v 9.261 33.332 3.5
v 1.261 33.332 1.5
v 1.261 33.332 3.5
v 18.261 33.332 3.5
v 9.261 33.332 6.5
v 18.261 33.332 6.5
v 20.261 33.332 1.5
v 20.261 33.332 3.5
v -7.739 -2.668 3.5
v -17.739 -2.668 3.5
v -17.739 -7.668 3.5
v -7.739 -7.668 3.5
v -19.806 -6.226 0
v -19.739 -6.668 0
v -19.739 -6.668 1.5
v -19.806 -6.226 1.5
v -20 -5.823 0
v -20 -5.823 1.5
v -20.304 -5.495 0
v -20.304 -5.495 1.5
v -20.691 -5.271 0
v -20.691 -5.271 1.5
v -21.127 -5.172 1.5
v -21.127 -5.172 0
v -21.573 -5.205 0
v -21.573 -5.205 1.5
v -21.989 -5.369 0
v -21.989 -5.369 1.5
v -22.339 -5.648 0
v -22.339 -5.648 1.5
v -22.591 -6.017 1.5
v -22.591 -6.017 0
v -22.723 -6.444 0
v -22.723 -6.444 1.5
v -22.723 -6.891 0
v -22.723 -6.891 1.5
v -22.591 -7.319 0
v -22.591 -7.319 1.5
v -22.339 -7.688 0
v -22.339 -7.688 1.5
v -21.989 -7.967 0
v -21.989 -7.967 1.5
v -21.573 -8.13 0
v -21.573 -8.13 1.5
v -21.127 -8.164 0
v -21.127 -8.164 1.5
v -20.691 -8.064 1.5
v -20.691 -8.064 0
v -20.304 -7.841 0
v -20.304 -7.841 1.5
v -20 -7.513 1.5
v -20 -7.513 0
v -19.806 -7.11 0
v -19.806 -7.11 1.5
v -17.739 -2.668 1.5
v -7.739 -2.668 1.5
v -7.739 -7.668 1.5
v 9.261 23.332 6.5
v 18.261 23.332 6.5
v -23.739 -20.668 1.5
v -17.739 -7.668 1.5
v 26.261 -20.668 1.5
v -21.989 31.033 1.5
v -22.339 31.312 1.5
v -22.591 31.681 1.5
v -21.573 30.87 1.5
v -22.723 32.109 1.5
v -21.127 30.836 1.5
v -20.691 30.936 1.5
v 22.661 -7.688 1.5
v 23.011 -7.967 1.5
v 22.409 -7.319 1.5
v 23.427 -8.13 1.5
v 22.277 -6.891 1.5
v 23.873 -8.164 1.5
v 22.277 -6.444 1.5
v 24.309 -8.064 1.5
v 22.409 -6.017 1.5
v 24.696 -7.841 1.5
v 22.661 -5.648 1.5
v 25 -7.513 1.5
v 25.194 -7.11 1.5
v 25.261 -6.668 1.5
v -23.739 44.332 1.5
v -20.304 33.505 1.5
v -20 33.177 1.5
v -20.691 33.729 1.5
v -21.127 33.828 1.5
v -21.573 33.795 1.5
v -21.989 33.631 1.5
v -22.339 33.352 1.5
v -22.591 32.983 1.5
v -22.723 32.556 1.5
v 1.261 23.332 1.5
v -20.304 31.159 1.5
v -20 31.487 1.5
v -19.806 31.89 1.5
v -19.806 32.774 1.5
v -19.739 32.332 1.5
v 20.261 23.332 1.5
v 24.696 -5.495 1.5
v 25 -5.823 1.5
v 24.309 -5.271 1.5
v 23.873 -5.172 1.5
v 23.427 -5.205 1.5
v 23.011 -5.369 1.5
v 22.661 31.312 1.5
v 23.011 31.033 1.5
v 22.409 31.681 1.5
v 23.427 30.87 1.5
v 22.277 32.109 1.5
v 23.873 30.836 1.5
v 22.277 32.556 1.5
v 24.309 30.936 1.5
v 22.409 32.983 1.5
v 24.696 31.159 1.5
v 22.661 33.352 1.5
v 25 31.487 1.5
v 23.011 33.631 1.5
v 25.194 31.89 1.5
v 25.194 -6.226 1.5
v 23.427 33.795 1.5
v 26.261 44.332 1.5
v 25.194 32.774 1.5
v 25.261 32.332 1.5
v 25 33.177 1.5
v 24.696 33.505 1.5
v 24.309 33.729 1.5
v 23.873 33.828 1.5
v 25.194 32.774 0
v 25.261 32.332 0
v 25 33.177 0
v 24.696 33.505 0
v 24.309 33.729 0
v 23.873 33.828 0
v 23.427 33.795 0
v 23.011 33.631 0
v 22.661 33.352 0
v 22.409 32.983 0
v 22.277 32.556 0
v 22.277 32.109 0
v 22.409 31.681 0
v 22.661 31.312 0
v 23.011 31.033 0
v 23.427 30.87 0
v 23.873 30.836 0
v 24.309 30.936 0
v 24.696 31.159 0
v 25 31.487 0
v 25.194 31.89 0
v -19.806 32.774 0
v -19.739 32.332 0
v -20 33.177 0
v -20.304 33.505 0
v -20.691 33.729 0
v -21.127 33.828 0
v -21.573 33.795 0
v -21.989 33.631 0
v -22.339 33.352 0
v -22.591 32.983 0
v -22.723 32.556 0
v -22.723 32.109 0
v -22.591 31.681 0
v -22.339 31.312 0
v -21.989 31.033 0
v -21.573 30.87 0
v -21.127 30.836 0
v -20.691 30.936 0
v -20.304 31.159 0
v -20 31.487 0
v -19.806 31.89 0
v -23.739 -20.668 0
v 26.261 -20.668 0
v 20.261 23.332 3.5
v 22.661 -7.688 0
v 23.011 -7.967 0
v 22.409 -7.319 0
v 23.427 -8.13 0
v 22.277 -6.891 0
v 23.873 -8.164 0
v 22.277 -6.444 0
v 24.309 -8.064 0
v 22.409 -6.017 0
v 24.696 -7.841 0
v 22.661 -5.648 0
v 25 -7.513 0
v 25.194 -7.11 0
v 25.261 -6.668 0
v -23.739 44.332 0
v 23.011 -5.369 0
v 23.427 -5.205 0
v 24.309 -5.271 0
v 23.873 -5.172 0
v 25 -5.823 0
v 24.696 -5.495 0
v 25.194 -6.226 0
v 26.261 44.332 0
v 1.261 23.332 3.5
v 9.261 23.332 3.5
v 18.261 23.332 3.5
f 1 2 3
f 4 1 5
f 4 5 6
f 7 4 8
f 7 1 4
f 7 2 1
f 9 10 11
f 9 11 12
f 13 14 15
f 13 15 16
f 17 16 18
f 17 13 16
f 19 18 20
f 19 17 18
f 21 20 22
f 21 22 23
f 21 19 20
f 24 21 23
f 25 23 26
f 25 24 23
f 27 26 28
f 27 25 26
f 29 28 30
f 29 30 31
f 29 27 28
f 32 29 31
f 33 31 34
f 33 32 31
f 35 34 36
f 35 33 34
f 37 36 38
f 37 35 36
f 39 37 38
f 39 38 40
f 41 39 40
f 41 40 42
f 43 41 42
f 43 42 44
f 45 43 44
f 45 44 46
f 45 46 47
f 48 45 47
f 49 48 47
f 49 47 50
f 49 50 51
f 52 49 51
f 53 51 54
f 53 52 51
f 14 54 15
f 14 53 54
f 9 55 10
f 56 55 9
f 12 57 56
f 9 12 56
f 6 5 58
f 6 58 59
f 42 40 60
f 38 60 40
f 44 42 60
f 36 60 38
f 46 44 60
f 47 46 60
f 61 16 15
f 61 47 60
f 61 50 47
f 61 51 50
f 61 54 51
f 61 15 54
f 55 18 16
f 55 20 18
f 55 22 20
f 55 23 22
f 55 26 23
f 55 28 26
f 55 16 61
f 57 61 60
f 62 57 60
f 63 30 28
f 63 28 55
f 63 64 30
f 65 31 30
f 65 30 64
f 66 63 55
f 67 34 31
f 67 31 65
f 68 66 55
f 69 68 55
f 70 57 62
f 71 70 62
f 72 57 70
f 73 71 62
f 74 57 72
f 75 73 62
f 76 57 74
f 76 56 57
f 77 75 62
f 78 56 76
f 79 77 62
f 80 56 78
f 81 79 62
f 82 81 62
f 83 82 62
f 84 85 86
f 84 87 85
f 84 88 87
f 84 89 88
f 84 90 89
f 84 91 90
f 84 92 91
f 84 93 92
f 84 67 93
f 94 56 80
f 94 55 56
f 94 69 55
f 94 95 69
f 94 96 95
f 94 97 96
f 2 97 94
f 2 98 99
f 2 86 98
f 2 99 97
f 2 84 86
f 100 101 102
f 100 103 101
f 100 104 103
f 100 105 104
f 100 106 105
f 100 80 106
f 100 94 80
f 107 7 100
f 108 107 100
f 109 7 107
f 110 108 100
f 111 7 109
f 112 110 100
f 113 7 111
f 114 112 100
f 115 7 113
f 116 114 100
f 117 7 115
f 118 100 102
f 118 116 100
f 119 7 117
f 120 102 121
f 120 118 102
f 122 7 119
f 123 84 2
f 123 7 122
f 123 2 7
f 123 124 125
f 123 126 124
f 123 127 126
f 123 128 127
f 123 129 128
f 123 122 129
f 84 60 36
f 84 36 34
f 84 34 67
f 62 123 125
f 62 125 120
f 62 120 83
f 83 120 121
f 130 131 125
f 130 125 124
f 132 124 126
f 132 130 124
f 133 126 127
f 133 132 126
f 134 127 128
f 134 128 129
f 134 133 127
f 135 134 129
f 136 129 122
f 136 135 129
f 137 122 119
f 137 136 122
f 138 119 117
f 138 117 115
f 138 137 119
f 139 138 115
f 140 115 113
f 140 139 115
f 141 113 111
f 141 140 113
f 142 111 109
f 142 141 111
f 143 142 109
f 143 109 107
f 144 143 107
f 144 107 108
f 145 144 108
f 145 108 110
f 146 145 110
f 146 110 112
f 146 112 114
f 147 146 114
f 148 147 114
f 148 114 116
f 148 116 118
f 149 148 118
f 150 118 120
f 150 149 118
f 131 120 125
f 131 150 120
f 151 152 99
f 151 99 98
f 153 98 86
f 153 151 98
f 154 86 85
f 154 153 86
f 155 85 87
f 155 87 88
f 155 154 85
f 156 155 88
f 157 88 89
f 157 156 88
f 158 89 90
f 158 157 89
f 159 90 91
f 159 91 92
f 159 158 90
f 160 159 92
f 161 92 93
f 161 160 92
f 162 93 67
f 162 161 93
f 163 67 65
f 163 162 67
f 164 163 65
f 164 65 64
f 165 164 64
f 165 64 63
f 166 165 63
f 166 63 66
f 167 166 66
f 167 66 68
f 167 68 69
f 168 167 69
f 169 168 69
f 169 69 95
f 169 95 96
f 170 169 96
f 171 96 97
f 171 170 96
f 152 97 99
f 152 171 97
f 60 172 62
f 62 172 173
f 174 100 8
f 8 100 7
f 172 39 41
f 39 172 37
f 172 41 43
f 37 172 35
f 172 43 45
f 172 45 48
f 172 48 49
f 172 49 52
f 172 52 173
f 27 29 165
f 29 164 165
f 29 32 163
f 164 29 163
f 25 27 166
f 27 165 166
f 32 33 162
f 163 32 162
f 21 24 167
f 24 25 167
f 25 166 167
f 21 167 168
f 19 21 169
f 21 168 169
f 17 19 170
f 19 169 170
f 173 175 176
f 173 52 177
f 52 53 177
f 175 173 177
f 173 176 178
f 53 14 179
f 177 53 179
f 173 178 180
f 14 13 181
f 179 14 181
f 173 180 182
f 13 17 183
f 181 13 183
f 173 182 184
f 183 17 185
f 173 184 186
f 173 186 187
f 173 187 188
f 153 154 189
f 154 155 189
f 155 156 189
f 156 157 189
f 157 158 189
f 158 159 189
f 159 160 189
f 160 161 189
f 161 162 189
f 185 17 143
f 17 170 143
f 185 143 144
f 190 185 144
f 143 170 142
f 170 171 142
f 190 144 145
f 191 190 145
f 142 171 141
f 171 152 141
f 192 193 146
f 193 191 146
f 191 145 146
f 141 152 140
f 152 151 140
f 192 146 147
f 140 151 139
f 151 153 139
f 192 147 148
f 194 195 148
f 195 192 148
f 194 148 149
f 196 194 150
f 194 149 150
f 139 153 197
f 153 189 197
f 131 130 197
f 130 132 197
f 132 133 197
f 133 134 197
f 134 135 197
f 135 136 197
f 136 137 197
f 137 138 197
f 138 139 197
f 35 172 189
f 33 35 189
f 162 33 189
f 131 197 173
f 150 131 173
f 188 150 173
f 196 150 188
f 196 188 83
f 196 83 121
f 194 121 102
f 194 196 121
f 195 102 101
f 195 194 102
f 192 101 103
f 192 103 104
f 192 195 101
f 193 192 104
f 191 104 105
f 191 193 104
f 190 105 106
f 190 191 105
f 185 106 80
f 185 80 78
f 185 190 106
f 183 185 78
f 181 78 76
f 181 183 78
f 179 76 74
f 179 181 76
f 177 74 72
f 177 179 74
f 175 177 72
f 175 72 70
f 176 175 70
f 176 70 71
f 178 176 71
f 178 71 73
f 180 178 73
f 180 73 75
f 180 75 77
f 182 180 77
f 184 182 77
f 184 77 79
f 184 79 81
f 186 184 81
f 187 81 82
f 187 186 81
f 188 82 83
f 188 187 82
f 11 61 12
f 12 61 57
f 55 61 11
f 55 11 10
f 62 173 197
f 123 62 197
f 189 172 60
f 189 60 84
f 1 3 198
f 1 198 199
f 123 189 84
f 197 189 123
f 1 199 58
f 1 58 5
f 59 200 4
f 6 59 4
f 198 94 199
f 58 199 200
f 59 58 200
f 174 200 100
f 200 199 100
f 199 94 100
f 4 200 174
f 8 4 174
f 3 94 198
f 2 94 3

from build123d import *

# Parameters (mm, degrees)
F0_W     = 50
F0_H     = 65
F0_R     = 1.5
F1_DEPTH = 1.5
F2_W     = 10
F2_H     = 5
F3_DEPTH = 2
F2_W_2   = 9
F2_H_2   = 10
F4_DEPTH = 5
F2_W_3   = 2
F2_W_4   = 8
F5_DEPTH = 2


with BuildPart() as f1:
    # F0 (on Top) → F1 (new body)
    with BuildSketch(Plane.XY):
        with Locations((1.260573, 11.832207)):
            Rectangle(F0_W, F0_H)
        with Locations((-21.239427, -6.667793)):
            Circle(F0_R, mode=Mode.SUBTRACT)
        with Locations((23.760573, -6.667793)):
            Circle(F0_R, mode=Mode.SUBTRACT)
        with Locations((-21.239427, 32.332207)):
            Circle(F0_R, mode=Mode.SUBTRACT)
        with Locations((23.760573, 32.332207)):
            Circle(F0_R, mode=Mode.SUBTRACT)
    extrude(amount=F1_DEPTH)

    # F2 (on face) → F3 (join)
    with BuildSketch(Plane.XY.offset(1.5)):
        with Locations((-12.739427, -5.167793)):
            Rectangle(F2_W, F2_H)
    extrude(amount=F3_DEPTH)

    # F2 (on face) → F4 (join)
    with BuildSketch(Plane.XY.offset(1.5)):
        with Locations((13.760573, 28.332207)):
            Rectangle(F2_W_2, F2_H_2)
    extrude(amount=F4_DEPTH)

    # F2 (on face) → F5 (join)
    with BuildSketch(Plane.XY.offset(1.5)):
        with Locations((19.260573, 28.332207)):
            Rectangle(F2_W_3, F2_H_2)
        with Locations((5.260573, 28.332207)):
            Rectangle(F2_W_4, F2_H_2)
    extrude(amount=F5_DEPTH)


solid = f1.part
